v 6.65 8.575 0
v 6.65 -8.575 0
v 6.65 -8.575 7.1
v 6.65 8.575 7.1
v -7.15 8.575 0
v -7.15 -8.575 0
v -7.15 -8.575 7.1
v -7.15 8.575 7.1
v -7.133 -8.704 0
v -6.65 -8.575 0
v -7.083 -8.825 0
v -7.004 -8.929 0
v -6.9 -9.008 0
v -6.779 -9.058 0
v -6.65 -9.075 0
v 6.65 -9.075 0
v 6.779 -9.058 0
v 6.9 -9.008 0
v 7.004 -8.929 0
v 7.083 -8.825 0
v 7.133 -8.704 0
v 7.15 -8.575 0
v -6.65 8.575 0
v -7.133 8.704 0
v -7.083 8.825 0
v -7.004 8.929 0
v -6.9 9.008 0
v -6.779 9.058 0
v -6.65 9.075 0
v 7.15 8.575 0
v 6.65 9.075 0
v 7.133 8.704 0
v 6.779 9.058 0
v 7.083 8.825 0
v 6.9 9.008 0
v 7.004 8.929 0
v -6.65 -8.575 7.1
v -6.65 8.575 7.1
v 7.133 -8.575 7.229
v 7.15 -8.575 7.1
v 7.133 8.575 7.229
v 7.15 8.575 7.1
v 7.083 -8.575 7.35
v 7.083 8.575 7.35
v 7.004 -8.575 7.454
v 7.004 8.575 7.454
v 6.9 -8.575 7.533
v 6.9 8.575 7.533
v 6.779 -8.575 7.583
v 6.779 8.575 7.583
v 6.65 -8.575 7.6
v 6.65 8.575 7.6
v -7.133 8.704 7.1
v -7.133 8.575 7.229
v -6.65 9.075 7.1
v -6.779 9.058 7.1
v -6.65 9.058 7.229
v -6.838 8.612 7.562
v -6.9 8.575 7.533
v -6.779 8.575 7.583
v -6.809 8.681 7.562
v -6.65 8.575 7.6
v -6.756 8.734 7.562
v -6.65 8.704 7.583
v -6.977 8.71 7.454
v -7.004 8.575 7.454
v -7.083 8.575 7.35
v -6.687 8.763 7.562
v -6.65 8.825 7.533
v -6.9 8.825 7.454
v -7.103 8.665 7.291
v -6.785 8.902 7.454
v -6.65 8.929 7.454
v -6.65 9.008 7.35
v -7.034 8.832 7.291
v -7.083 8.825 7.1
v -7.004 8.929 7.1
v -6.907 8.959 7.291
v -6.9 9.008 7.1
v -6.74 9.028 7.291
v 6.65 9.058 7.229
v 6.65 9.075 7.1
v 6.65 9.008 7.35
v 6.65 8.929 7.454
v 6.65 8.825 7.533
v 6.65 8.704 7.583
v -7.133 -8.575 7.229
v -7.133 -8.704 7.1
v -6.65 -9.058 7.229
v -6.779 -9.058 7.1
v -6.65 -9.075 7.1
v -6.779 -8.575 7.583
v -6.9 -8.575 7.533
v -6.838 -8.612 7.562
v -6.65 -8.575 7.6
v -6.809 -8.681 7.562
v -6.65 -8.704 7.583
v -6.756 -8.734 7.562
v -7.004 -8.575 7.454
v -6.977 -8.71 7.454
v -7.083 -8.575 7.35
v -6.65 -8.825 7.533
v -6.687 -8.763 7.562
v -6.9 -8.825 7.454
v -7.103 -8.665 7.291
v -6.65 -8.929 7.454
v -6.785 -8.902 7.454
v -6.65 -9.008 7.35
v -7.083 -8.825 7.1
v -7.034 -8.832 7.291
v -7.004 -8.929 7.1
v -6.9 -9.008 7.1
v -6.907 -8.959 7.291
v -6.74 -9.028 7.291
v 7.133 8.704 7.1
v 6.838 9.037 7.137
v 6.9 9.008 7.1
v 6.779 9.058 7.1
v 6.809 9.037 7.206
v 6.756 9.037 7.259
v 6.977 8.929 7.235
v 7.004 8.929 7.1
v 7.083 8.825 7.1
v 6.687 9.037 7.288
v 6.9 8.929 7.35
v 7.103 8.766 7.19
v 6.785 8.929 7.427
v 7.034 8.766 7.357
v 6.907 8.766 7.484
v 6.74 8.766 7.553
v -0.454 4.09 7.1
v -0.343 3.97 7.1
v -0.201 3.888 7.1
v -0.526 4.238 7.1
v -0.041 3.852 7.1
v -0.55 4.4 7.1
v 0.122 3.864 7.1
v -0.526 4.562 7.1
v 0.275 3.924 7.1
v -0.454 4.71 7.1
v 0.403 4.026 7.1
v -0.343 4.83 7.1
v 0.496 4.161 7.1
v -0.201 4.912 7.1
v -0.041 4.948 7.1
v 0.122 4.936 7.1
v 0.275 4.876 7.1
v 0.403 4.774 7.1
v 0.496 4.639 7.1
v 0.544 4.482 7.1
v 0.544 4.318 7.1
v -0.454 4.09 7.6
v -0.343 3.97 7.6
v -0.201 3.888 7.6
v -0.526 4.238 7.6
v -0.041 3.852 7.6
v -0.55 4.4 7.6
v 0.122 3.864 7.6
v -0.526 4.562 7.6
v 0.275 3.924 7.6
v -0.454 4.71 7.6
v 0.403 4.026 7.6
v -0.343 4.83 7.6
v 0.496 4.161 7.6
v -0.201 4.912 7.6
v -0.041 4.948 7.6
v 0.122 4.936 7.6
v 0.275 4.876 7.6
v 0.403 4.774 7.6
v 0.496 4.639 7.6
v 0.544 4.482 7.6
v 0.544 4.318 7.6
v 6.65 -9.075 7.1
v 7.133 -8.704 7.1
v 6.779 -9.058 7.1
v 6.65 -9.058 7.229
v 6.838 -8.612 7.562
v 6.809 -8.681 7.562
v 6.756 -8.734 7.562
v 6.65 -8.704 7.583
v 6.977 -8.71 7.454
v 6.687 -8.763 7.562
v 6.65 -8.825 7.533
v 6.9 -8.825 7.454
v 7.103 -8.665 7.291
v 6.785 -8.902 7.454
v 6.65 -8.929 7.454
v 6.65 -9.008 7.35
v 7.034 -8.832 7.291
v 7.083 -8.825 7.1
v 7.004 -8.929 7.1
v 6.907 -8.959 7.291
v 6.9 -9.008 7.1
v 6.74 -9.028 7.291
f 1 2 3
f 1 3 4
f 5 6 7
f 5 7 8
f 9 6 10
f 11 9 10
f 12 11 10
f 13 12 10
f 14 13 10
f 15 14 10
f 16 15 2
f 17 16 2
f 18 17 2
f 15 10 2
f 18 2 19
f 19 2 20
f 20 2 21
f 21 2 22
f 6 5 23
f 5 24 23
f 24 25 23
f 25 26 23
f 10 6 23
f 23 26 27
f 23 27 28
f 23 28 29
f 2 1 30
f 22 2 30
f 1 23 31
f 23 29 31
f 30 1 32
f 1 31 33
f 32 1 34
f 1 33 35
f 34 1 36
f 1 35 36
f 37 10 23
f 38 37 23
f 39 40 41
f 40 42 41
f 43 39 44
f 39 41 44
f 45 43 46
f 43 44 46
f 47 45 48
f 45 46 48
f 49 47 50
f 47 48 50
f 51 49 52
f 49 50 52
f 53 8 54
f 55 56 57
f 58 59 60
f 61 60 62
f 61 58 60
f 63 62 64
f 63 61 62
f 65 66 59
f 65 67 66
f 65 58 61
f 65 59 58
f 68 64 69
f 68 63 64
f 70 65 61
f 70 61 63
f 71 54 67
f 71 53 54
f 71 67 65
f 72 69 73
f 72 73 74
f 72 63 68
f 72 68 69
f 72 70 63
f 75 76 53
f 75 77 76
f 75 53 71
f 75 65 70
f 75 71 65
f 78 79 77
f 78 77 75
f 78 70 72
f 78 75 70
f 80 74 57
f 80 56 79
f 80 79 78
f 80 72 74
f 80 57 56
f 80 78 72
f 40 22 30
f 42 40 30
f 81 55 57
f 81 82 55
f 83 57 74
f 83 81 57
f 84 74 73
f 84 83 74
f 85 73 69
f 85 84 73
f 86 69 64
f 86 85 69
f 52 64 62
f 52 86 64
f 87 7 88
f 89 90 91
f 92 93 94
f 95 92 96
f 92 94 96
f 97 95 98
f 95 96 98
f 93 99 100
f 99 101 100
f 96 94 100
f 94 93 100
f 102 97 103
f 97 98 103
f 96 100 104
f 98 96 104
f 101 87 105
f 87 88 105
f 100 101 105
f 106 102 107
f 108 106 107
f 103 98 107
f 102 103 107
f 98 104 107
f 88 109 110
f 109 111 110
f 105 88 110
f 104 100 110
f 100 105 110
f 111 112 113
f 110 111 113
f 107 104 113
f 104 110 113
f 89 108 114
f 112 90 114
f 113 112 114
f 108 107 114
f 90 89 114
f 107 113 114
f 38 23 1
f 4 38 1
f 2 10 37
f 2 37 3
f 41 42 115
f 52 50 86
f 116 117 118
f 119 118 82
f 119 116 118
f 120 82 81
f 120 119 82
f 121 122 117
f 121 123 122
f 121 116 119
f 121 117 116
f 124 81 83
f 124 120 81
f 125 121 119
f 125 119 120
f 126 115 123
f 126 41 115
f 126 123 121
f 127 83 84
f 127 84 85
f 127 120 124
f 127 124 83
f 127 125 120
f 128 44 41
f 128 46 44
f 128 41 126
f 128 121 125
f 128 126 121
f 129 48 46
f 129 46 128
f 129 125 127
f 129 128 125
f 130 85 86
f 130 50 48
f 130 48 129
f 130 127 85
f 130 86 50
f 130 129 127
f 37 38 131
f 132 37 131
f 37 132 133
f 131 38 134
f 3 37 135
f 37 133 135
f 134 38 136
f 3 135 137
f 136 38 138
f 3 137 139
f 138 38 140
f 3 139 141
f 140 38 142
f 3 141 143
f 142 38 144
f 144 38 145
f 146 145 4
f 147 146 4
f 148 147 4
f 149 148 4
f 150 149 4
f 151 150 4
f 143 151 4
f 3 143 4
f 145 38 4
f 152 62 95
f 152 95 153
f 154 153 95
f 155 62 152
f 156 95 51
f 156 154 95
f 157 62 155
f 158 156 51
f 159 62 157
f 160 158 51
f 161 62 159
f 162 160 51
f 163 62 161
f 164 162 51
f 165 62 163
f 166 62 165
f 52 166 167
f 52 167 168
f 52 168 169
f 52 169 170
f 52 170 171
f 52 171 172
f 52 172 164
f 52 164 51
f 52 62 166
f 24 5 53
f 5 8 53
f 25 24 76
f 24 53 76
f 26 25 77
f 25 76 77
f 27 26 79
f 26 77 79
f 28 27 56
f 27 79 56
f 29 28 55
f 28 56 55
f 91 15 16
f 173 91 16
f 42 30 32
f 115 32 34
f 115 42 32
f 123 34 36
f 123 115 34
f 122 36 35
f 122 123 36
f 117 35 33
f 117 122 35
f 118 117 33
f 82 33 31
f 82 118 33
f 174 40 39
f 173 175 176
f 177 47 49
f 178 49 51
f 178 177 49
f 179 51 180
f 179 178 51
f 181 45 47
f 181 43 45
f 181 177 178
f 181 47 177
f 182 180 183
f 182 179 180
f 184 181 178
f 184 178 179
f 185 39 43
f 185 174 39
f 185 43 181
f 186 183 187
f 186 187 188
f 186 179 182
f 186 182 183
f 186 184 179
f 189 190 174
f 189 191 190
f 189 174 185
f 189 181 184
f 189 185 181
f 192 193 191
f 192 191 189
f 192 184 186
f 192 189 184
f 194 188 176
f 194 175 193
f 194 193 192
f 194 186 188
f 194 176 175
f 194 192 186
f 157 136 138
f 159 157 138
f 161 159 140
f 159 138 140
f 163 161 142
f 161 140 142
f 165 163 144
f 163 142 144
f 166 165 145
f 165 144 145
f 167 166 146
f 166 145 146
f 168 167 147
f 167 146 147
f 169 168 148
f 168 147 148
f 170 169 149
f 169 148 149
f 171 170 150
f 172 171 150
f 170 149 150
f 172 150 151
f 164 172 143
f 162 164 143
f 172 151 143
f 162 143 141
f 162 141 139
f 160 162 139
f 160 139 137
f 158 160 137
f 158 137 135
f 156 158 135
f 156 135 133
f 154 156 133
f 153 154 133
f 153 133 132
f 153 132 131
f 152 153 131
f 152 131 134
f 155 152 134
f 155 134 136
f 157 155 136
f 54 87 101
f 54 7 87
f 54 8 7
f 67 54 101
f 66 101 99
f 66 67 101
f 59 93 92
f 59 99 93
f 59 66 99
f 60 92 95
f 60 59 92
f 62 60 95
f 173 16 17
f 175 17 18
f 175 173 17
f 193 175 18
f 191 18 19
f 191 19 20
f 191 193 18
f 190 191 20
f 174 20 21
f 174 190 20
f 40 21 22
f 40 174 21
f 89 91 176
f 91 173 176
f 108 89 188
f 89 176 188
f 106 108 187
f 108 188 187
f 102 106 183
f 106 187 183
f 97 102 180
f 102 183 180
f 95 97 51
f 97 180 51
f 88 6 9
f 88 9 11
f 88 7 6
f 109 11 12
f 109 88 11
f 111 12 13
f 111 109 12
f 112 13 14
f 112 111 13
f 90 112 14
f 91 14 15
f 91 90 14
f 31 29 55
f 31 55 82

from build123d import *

# Parameters (mm, degrees)
F3_W     = 14.3
F3_H     = 18.15
F4_DEPTH = 7.6
F5_R     = 0.5
F0_T     = 0.5
F2_D     = 1.1


# Not quite as in the source:
# - a shell that OpenCascade refuses in one call is made with other operations: the cavity is built on its own and cut out


with BuildPart() as f4:
    # F3 (on Top) → F4 (new body)
    with BuildSketch(Plane.XY):
        Rectangle(F3_W, F3_H)
    extrude(amount=F4_DEPTH)

    # F5
    f5_edges = [f4.edges().sort_by_distance(p)[0] for p in [
        (-7.15, -9.075, 3.8),
        (7.15, -9.075, 3.8),
        (7.15, 0, 7.6),
        (-7.15, 9.075, 3.8),
        (7.15, 9.075, 3.8),
        (-7.15, 0, 7.6),
        (0, 9.075, 7.6),
        (0, -9.075, 7.6),
    ]]
    fillet(f5_edges, radius=F5_R)

    # F0: shell of thickness 0.5, made by hand


with BuildPart() as f0_core1:
    # F0_t2: copy of F4
    add(f4.part)

    # the walls: a layer under each face that stays
    f0_faces = [f0_core1.faces().sort_by_distance(p)[0] for p in [
        (0, -9.075, 3.55),
        (-7.15, 0, 3.55),
        (7.15, 0, 3.55),
        (0, 9.075, 3.55),
        (0, 0, 7.6),
    ]]
    thicken(f0_faces, amount=-F0_T, mode=Mode.SUBTRACT)


with BuildPart() as f4_1:
    add(f4.part)

    # what is left inside the walls is the cavity
    f0_cavity = [f0_core1.part.solids().sort_by_distance(p)[0] for p in [
        (0, -2.858333, 0.005),
    ]]
    add(f0_cavity, mode=Mode.SUBTRACT)

    # F2 (through all)
    with Locations(Plane.XY.offset(7.6)):
        with Locations((0, 4.4)):
            Hole(F2_D / 2)


solid = f4_1.part
